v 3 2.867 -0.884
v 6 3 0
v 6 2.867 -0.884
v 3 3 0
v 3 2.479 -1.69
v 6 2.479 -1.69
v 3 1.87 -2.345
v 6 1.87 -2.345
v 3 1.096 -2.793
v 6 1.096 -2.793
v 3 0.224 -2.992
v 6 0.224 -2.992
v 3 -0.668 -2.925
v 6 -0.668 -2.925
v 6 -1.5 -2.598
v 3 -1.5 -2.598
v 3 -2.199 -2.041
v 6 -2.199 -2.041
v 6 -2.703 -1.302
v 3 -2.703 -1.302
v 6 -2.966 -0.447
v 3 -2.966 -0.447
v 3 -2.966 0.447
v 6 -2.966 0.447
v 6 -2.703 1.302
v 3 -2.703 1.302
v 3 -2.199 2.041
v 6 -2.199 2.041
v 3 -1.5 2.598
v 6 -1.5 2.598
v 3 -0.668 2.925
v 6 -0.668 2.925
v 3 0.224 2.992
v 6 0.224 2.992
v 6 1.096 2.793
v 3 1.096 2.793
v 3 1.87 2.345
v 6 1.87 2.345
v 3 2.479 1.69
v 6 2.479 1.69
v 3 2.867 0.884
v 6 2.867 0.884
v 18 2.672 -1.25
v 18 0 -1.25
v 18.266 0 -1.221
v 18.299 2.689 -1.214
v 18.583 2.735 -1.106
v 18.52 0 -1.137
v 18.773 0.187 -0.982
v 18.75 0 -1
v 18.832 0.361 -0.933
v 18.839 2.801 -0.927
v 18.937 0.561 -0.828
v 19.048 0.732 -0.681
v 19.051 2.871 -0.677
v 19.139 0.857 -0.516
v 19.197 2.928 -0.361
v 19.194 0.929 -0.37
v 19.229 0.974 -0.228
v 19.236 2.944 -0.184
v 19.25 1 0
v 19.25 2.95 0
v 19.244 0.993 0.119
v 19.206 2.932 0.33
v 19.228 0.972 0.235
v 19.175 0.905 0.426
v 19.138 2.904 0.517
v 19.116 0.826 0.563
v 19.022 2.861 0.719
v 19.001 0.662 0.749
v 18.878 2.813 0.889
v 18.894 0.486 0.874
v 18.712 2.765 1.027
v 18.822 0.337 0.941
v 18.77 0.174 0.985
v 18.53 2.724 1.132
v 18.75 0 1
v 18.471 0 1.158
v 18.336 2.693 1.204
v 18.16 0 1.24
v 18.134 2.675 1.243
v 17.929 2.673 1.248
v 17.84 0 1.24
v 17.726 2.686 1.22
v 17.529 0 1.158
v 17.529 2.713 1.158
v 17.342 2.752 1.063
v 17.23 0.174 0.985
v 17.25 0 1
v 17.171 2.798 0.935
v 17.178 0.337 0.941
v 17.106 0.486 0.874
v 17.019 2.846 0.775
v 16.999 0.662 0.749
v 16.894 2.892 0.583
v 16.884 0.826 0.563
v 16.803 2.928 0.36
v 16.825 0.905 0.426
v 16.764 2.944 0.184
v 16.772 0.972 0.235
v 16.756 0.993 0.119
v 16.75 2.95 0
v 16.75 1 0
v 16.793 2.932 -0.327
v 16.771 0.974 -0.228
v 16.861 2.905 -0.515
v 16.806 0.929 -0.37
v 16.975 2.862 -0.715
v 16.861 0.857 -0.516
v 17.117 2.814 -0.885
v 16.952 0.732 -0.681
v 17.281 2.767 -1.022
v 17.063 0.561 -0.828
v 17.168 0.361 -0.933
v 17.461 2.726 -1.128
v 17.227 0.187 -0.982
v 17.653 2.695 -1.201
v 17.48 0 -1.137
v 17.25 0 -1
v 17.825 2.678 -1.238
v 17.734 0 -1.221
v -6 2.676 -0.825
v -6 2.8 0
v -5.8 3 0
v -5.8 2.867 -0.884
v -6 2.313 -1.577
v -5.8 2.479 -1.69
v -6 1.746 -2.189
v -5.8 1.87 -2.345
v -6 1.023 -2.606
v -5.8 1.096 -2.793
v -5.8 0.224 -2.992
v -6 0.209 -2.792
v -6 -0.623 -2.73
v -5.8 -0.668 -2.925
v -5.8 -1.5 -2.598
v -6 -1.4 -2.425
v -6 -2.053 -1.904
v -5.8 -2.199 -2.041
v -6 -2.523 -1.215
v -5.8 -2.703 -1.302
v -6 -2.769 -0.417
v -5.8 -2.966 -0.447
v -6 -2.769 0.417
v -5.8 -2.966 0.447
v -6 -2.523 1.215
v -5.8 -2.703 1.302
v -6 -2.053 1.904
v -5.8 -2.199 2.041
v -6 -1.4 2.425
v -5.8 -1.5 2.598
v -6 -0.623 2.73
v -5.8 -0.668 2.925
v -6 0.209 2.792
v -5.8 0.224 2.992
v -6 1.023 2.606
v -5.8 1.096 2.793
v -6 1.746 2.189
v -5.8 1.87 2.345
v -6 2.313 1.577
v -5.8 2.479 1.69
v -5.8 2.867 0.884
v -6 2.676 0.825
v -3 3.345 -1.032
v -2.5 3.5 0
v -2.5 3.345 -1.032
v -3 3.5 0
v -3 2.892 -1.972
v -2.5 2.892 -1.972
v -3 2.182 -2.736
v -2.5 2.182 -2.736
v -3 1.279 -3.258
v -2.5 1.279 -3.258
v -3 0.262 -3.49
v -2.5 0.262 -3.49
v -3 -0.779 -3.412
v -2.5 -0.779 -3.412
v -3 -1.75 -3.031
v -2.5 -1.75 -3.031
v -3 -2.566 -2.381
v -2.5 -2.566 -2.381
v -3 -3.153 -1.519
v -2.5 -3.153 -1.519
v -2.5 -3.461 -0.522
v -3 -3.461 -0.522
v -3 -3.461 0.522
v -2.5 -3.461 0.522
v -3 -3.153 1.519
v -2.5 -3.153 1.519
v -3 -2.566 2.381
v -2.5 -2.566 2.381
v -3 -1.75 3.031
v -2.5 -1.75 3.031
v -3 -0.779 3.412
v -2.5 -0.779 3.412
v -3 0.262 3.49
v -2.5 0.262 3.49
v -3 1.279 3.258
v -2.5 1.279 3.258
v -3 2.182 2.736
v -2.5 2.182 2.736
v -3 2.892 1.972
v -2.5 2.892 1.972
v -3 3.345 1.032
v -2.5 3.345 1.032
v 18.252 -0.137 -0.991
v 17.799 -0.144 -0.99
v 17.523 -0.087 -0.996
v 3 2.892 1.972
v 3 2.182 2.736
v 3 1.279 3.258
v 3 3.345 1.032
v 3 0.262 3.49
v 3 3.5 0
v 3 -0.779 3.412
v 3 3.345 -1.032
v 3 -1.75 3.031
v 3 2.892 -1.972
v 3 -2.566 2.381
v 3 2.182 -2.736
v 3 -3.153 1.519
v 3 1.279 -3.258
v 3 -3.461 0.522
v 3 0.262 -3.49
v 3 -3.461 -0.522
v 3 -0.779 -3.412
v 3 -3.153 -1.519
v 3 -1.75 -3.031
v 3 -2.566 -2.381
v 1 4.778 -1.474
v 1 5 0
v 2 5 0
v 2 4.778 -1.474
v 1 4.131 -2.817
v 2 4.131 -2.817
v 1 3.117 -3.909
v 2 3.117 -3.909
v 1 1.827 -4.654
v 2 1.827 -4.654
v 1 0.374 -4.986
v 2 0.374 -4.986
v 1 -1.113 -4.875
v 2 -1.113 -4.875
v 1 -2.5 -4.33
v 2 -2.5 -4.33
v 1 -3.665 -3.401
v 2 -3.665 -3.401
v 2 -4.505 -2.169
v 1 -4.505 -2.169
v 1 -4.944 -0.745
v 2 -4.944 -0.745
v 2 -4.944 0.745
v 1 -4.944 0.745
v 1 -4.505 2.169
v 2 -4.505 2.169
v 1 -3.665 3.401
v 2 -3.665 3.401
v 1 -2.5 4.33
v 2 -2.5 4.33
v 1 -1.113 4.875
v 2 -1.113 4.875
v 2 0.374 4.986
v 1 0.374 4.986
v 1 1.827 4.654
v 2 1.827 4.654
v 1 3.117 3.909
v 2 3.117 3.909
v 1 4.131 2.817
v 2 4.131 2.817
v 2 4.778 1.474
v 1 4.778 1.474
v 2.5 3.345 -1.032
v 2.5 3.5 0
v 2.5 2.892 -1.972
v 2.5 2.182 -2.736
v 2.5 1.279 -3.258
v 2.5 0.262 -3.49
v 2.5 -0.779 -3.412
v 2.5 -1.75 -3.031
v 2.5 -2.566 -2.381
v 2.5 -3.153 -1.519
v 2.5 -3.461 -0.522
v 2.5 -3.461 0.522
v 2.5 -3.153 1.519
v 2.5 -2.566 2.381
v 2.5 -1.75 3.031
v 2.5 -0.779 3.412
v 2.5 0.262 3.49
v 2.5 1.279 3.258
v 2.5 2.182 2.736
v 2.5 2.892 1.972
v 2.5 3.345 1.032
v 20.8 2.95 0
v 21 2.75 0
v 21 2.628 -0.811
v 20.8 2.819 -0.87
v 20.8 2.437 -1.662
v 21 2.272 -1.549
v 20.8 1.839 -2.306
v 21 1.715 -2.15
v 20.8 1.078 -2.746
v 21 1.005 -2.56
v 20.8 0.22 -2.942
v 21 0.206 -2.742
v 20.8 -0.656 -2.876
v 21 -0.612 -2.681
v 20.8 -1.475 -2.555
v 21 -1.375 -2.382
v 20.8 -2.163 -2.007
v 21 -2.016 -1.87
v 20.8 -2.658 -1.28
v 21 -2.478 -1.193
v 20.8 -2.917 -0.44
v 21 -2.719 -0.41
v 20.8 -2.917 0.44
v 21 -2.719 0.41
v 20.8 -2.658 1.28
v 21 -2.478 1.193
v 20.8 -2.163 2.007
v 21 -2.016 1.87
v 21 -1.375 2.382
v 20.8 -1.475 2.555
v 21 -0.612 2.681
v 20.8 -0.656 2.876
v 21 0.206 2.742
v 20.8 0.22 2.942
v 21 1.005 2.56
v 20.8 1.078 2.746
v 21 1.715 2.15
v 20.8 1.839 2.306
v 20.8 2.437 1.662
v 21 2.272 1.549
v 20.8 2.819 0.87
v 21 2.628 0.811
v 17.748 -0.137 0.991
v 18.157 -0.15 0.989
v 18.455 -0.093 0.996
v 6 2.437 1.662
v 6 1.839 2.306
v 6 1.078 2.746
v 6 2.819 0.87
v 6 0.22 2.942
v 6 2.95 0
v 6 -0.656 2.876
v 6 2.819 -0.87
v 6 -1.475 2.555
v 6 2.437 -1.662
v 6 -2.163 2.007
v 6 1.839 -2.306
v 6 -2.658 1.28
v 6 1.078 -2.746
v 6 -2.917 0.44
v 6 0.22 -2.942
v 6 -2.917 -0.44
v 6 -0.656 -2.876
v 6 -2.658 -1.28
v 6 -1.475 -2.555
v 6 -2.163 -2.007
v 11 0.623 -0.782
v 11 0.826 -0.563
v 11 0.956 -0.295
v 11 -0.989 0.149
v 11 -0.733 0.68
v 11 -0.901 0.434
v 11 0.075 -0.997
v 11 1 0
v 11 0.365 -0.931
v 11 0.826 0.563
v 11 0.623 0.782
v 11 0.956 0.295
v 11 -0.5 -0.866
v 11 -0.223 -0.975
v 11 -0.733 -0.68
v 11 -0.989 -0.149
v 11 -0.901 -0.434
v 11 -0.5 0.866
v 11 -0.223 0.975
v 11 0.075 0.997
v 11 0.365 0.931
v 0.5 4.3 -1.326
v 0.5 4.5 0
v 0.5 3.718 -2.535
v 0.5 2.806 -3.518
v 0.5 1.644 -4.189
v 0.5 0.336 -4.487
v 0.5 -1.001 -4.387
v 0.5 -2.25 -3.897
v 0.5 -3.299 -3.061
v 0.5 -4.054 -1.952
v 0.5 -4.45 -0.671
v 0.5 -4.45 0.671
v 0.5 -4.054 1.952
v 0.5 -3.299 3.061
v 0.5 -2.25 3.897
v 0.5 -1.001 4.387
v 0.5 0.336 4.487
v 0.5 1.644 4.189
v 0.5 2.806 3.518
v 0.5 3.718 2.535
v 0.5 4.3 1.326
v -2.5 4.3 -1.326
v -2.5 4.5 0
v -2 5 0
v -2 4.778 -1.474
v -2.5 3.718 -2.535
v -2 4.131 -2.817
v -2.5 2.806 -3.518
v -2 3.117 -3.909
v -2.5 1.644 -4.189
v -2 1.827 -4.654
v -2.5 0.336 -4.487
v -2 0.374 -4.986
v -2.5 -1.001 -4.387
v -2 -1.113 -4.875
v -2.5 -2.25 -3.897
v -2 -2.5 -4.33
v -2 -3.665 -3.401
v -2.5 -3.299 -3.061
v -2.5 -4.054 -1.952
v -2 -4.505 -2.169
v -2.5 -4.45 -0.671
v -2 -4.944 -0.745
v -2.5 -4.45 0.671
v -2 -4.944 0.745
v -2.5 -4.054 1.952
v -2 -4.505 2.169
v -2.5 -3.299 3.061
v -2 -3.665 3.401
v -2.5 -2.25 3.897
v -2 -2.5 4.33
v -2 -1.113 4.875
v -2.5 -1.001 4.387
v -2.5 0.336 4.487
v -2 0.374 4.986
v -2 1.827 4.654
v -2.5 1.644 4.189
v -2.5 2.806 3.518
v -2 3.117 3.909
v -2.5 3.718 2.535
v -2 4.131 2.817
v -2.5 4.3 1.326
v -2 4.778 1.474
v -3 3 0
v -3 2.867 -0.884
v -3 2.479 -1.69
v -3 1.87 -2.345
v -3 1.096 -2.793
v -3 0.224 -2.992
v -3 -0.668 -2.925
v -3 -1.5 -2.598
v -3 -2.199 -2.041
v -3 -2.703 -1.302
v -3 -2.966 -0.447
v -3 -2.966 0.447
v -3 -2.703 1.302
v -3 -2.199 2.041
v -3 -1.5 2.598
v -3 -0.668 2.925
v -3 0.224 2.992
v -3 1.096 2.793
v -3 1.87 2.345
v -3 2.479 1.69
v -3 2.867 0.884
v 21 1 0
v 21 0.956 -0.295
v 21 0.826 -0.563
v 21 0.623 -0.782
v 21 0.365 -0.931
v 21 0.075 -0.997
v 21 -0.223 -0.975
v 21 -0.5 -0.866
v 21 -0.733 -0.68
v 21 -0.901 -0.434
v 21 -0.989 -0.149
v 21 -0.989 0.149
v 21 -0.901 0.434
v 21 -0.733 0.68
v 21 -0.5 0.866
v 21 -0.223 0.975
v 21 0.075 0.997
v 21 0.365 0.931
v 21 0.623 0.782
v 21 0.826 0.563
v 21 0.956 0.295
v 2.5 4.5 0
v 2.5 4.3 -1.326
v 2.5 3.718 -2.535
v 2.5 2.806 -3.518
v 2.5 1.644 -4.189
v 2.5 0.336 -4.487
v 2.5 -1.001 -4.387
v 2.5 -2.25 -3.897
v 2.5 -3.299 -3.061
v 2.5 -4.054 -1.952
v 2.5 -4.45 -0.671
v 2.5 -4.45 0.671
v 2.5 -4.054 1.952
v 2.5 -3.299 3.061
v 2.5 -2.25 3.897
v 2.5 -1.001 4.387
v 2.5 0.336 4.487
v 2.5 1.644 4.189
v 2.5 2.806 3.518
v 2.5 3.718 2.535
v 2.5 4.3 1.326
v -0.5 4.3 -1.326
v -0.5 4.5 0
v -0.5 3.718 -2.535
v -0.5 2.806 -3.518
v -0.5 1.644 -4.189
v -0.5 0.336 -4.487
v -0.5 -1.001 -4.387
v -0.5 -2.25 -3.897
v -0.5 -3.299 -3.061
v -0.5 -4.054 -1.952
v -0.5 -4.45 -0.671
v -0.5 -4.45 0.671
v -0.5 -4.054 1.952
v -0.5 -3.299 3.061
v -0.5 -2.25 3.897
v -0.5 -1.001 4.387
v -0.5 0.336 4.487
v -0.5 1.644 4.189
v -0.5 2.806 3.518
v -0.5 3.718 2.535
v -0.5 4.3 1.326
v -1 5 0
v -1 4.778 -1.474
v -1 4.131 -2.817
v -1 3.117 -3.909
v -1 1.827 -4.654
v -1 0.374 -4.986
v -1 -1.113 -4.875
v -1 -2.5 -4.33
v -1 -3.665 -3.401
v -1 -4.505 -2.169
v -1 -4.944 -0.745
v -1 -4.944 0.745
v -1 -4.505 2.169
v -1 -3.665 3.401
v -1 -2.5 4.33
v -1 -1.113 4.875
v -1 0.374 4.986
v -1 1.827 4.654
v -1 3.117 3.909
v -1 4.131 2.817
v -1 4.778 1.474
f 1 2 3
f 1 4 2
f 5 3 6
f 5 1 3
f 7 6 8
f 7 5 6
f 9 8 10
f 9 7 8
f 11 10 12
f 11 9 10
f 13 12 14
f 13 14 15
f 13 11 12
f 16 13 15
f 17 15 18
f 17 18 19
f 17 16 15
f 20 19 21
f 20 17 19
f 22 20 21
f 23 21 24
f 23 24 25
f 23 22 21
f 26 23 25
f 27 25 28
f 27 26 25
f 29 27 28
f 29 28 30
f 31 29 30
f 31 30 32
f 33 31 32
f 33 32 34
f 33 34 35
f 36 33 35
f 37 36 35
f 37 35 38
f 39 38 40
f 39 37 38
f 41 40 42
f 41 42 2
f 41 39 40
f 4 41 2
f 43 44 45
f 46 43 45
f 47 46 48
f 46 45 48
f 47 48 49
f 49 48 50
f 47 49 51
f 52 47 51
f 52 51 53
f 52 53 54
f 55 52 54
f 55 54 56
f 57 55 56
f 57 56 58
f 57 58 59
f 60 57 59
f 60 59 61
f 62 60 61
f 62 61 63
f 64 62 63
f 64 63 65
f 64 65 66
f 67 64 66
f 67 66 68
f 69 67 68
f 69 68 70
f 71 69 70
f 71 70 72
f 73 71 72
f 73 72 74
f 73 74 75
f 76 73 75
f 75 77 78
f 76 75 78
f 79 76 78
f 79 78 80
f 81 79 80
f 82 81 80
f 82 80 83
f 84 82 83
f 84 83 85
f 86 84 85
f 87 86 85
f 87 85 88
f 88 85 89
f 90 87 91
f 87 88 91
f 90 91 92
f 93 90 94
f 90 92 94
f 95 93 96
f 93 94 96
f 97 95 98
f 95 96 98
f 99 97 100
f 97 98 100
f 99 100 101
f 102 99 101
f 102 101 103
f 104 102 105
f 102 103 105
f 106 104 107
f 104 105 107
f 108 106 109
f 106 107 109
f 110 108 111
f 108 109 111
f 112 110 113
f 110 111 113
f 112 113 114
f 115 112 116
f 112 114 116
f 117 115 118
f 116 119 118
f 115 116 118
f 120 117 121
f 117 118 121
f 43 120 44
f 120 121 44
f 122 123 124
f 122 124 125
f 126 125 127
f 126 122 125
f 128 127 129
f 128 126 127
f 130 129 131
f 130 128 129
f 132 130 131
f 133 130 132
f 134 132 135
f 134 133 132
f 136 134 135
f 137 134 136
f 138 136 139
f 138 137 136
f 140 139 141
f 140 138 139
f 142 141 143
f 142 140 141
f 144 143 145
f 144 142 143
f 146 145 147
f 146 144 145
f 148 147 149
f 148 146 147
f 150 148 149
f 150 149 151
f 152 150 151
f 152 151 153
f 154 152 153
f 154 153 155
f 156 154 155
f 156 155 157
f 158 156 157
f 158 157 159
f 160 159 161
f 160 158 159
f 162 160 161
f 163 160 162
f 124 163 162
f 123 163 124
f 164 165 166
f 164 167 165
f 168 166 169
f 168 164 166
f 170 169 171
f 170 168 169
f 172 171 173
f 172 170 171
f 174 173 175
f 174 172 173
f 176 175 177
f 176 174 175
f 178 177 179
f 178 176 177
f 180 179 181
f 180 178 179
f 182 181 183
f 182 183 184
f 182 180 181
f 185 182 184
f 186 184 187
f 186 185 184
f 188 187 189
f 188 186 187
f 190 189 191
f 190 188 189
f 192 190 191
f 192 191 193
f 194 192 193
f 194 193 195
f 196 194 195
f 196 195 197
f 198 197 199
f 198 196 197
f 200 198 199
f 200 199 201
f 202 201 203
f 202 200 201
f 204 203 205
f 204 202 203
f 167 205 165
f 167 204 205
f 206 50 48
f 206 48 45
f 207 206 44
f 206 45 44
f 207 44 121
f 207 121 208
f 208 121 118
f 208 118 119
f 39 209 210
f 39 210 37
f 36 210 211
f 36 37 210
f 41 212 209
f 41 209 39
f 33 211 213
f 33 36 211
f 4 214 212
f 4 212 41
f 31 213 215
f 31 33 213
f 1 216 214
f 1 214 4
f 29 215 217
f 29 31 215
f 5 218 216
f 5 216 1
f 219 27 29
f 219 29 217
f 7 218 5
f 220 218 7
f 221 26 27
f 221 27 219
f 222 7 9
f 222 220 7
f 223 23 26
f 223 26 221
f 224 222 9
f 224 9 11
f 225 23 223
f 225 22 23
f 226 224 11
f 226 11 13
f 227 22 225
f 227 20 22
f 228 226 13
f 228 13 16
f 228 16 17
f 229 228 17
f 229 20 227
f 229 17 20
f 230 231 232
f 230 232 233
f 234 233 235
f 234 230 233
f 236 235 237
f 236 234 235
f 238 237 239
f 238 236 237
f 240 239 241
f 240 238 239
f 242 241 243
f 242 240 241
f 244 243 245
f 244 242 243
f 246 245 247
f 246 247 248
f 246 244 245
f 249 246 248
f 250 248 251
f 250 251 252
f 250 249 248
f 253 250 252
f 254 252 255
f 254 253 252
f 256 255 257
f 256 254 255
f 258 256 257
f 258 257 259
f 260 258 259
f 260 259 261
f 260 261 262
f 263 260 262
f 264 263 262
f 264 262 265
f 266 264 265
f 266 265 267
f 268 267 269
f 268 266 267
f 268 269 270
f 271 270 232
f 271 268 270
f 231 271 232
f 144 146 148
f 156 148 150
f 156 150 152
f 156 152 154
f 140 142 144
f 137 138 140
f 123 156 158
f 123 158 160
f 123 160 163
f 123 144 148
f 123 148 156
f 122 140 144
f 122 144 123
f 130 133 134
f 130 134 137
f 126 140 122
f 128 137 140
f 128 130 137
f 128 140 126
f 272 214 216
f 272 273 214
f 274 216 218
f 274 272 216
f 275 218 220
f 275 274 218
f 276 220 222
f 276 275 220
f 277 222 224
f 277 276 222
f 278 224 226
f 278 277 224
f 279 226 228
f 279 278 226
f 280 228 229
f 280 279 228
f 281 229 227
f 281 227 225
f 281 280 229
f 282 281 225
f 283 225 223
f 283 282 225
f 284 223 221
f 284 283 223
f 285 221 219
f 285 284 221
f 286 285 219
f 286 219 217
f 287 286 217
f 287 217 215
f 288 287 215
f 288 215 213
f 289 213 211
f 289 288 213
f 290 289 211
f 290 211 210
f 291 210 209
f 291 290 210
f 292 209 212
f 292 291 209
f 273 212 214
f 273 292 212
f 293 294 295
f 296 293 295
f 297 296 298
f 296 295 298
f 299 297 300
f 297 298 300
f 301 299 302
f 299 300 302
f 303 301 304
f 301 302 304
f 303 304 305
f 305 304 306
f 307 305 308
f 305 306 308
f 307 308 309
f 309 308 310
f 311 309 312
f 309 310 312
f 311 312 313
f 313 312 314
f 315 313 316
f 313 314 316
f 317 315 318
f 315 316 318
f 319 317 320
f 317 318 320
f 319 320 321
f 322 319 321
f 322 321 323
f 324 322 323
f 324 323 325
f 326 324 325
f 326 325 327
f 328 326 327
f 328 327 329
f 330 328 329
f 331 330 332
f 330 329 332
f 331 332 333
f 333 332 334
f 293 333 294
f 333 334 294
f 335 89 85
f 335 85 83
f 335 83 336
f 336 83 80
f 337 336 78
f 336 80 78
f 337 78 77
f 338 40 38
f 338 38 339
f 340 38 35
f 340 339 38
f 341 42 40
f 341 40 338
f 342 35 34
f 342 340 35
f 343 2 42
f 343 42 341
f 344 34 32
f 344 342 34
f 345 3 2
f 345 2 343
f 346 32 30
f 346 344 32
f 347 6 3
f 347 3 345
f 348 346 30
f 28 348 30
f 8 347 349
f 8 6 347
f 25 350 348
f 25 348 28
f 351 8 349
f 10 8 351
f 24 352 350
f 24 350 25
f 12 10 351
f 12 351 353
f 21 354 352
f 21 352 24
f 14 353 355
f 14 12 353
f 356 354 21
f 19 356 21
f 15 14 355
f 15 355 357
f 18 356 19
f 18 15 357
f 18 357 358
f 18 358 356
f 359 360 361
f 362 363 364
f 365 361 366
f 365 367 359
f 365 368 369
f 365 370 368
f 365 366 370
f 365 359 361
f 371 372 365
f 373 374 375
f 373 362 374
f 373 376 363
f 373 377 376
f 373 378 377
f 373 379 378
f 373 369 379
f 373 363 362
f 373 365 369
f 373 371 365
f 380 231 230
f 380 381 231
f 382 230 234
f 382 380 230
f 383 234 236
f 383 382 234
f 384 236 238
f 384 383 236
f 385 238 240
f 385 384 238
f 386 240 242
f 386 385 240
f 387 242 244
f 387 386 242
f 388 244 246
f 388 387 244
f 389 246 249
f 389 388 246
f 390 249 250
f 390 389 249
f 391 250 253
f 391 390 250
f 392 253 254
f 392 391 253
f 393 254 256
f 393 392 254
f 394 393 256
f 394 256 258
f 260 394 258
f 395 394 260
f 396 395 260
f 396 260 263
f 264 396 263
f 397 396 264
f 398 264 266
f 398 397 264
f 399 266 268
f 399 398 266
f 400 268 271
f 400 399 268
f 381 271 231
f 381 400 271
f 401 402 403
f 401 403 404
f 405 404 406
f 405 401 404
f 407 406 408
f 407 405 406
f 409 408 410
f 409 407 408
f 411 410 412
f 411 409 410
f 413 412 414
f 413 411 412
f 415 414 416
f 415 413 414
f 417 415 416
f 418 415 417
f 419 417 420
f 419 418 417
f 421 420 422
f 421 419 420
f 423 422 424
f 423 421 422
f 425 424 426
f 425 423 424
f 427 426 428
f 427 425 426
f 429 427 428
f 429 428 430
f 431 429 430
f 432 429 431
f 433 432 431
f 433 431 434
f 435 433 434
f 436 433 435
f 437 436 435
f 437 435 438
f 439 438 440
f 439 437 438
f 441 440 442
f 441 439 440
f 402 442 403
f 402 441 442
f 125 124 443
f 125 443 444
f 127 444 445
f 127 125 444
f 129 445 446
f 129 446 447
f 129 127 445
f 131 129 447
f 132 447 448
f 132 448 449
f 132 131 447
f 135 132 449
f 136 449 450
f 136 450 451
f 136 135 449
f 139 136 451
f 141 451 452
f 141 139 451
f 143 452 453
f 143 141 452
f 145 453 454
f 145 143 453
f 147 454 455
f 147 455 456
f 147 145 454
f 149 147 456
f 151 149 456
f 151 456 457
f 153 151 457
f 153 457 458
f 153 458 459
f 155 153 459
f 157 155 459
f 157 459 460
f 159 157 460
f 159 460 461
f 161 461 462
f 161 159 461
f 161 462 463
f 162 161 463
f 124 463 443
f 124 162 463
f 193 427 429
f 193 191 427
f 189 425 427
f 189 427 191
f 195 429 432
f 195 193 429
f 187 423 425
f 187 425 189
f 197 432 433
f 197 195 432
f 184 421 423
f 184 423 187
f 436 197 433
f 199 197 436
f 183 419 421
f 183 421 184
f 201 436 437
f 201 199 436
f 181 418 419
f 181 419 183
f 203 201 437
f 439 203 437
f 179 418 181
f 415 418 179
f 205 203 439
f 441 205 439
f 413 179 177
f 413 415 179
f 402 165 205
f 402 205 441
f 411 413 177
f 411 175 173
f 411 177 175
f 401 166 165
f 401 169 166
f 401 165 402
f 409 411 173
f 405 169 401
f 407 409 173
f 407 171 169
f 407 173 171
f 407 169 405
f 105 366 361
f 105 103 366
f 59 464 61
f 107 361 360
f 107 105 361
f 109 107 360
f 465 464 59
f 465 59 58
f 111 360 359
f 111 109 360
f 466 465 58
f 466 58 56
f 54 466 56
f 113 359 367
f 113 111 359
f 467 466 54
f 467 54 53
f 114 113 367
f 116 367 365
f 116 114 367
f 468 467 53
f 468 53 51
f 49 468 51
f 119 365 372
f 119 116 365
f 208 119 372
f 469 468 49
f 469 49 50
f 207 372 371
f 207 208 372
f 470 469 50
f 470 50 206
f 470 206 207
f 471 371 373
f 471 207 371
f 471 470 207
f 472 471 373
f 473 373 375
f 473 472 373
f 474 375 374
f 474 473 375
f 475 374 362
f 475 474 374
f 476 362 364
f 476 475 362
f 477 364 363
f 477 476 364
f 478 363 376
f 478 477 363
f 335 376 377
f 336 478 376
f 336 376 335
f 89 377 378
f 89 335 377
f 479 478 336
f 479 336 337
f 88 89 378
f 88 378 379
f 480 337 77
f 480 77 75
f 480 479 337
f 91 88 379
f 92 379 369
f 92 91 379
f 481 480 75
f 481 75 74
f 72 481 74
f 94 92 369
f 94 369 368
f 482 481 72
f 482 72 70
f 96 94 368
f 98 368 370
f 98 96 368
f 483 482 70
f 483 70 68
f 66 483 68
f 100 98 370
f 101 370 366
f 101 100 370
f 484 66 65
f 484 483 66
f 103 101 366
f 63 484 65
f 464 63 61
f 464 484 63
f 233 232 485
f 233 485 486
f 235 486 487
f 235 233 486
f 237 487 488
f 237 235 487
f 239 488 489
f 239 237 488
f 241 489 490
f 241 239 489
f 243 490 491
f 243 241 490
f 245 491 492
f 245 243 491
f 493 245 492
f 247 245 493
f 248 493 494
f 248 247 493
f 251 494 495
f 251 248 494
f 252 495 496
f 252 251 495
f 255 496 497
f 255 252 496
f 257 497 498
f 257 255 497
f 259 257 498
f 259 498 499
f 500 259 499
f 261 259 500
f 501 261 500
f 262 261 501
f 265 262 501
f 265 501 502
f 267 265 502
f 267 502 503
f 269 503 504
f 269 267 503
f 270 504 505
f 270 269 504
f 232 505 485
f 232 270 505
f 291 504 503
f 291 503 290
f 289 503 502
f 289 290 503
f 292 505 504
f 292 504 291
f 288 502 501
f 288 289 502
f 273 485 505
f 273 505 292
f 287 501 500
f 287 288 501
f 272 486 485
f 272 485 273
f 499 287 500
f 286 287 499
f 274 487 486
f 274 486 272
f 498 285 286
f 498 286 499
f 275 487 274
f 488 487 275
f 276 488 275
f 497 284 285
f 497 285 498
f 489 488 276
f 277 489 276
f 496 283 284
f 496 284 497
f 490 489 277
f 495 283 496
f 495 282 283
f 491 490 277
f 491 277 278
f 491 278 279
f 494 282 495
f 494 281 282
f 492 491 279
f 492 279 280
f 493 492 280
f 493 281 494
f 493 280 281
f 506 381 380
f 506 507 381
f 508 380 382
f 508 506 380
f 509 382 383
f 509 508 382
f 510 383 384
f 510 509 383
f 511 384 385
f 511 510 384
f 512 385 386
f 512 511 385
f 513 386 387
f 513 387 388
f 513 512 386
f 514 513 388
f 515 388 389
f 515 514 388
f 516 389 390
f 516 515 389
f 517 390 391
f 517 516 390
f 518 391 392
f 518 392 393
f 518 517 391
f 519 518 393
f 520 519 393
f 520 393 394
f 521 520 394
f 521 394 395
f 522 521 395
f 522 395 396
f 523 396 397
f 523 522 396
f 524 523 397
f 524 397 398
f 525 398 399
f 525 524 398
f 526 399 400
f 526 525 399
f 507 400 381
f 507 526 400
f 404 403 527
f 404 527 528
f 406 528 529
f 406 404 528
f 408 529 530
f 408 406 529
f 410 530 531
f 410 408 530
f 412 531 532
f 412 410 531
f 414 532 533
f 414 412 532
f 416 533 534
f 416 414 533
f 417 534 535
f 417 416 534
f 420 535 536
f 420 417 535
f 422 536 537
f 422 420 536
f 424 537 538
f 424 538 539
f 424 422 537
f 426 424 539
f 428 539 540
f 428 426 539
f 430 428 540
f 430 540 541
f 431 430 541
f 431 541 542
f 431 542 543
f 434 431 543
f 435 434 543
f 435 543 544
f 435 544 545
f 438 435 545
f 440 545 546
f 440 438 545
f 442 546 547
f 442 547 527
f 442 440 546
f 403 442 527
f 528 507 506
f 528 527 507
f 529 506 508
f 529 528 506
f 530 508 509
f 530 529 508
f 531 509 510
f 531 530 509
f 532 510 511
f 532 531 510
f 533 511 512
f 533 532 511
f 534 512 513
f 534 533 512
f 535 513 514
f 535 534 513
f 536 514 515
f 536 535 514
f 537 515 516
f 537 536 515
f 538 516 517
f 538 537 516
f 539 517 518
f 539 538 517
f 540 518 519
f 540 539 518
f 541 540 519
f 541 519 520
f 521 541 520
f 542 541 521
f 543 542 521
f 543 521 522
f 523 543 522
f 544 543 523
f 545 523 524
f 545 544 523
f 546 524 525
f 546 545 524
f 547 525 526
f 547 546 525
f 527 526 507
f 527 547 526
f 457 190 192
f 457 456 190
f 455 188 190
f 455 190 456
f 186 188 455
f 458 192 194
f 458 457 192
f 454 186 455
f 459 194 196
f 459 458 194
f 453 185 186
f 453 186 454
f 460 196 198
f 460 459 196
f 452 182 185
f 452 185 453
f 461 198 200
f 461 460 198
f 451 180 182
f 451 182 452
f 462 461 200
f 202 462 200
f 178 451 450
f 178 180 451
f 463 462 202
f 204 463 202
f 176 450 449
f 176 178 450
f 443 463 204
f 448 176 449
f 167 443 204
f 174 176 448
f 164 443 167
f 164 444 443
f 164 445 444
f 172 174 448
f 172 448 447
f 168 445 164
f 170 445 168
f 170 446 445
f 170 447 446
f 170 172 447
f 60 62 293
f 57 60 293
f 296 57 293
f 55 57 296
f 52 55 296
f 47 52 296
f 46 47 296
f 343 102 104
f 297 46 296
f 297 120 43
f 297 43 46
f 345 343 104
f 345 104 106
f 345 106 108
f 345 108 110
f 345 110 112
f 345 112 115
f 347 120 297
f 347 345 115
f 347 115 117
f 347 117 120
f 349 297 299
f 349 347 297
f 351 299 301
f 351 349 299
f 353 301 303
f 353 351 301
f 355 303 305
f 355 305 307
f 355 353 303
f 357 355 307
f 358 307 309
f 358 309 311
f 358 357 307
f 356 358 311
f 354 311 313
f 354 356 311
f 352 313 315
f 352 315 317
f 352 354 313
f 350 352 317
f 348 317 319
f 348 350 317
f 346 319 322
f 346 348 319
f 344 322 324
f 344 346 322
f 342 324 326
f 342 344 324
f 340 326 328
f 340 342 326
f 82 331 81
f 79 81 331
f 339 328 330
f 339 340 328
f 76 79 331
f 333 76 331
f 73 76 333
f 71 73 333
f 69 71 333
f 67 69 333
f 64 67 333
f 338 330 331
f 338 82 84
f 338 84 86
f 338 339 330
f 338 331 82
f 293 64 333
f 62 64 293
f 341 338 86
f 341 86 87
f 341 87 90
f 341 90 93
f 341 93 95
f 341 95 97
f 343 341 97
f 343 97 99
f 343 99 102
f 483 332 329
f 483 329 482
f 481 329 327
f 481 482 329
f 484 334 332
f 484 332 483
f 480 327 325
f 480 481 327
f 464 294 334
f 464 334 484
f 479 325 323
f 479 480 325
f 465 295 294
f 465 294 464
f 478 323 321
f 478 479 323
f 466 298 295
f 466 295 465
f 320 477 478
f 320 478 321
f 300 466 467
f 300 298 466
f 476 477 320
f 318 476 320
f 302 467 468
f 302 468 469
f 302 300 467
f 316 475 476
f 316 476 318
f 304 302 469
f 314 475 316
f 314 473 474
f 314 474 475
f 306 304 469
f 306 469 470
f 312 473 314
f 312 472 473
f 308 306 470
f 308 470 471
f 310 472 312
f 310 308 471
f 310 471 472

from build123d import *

# Parameters (mm, degrees)
FASE1_SIZE               = 0.5
M3_GEWINDEBOHRUNG1_D     = 2.5
M3_GEWINDEBOHRUNG1_DEPTH = 3
M3_GEWINDEBOHRUNG1_TIP   = 0.751075774
FASE2_SIZE               = 0.2


with BuildPart() as part:
    # Skizze1 → Rotation1 (revolve)
    with BuildSketch(Plane.XY):
        Polygon((-3, 3), (-6, 3), (-6, 0), (11, 0), (11, 1), (21, 1), (21, 2.95), (6, 2.95), (6, 3), (3, 3), (3, 3.5), (2.5, 3.5), (2.5, 5), (1, 5), (0.5, 4.5), (-0.5, 4.5), (-1, 5), (-2.5, 5), (-2.5, 3.5), (-3, 3.5), align=None)
    revolve(axis=Axis((-5.518776228, 0, 0), (-1, 0, 0)))

    # Fase1
    fase1_edges = [part.edges().sort_by_distance(p)[0] for p in [
        (2.5, -5, 0),
        (-2.5, -5, 0),
    ]]
    chamfer(fase1_edges, length=FASE1_SIZE)

    # M3 Gewindebohrung1
    with Locations(Plane(origin=(18, 3, 0), x_dir=(0, 0, 1), z_dir=(0, 1, 0))):
        with Locations((0, 0)):
            Hole(M3_GEWINDEBOHRUNG1_D / 2, depth=M3_GEWINDEBOHRUNG1_DEPTH)
            with Locations((0, 0, -(M3_GEWINDEBOHRUNG1_DEPTH + M3_GEWINDEBOHRUNG1_TIP / 2))):  # 118° drill point
                Cone(0, M3_GEWINDEBOHRUNG1_D / 2, M3_GEWINDEBOHRUNG1_TIP, mode=Mode.SUBTRACT)

    # Fase2
    fase2_edges = [part.edges().sort_by_distance(p)[0] for p in [
        (-6, -3, 0),
        (21, -2.95, 0),
    ]]
    chamfer(fase2_edges, length=FASE2_SIZE)


solid = part.part
